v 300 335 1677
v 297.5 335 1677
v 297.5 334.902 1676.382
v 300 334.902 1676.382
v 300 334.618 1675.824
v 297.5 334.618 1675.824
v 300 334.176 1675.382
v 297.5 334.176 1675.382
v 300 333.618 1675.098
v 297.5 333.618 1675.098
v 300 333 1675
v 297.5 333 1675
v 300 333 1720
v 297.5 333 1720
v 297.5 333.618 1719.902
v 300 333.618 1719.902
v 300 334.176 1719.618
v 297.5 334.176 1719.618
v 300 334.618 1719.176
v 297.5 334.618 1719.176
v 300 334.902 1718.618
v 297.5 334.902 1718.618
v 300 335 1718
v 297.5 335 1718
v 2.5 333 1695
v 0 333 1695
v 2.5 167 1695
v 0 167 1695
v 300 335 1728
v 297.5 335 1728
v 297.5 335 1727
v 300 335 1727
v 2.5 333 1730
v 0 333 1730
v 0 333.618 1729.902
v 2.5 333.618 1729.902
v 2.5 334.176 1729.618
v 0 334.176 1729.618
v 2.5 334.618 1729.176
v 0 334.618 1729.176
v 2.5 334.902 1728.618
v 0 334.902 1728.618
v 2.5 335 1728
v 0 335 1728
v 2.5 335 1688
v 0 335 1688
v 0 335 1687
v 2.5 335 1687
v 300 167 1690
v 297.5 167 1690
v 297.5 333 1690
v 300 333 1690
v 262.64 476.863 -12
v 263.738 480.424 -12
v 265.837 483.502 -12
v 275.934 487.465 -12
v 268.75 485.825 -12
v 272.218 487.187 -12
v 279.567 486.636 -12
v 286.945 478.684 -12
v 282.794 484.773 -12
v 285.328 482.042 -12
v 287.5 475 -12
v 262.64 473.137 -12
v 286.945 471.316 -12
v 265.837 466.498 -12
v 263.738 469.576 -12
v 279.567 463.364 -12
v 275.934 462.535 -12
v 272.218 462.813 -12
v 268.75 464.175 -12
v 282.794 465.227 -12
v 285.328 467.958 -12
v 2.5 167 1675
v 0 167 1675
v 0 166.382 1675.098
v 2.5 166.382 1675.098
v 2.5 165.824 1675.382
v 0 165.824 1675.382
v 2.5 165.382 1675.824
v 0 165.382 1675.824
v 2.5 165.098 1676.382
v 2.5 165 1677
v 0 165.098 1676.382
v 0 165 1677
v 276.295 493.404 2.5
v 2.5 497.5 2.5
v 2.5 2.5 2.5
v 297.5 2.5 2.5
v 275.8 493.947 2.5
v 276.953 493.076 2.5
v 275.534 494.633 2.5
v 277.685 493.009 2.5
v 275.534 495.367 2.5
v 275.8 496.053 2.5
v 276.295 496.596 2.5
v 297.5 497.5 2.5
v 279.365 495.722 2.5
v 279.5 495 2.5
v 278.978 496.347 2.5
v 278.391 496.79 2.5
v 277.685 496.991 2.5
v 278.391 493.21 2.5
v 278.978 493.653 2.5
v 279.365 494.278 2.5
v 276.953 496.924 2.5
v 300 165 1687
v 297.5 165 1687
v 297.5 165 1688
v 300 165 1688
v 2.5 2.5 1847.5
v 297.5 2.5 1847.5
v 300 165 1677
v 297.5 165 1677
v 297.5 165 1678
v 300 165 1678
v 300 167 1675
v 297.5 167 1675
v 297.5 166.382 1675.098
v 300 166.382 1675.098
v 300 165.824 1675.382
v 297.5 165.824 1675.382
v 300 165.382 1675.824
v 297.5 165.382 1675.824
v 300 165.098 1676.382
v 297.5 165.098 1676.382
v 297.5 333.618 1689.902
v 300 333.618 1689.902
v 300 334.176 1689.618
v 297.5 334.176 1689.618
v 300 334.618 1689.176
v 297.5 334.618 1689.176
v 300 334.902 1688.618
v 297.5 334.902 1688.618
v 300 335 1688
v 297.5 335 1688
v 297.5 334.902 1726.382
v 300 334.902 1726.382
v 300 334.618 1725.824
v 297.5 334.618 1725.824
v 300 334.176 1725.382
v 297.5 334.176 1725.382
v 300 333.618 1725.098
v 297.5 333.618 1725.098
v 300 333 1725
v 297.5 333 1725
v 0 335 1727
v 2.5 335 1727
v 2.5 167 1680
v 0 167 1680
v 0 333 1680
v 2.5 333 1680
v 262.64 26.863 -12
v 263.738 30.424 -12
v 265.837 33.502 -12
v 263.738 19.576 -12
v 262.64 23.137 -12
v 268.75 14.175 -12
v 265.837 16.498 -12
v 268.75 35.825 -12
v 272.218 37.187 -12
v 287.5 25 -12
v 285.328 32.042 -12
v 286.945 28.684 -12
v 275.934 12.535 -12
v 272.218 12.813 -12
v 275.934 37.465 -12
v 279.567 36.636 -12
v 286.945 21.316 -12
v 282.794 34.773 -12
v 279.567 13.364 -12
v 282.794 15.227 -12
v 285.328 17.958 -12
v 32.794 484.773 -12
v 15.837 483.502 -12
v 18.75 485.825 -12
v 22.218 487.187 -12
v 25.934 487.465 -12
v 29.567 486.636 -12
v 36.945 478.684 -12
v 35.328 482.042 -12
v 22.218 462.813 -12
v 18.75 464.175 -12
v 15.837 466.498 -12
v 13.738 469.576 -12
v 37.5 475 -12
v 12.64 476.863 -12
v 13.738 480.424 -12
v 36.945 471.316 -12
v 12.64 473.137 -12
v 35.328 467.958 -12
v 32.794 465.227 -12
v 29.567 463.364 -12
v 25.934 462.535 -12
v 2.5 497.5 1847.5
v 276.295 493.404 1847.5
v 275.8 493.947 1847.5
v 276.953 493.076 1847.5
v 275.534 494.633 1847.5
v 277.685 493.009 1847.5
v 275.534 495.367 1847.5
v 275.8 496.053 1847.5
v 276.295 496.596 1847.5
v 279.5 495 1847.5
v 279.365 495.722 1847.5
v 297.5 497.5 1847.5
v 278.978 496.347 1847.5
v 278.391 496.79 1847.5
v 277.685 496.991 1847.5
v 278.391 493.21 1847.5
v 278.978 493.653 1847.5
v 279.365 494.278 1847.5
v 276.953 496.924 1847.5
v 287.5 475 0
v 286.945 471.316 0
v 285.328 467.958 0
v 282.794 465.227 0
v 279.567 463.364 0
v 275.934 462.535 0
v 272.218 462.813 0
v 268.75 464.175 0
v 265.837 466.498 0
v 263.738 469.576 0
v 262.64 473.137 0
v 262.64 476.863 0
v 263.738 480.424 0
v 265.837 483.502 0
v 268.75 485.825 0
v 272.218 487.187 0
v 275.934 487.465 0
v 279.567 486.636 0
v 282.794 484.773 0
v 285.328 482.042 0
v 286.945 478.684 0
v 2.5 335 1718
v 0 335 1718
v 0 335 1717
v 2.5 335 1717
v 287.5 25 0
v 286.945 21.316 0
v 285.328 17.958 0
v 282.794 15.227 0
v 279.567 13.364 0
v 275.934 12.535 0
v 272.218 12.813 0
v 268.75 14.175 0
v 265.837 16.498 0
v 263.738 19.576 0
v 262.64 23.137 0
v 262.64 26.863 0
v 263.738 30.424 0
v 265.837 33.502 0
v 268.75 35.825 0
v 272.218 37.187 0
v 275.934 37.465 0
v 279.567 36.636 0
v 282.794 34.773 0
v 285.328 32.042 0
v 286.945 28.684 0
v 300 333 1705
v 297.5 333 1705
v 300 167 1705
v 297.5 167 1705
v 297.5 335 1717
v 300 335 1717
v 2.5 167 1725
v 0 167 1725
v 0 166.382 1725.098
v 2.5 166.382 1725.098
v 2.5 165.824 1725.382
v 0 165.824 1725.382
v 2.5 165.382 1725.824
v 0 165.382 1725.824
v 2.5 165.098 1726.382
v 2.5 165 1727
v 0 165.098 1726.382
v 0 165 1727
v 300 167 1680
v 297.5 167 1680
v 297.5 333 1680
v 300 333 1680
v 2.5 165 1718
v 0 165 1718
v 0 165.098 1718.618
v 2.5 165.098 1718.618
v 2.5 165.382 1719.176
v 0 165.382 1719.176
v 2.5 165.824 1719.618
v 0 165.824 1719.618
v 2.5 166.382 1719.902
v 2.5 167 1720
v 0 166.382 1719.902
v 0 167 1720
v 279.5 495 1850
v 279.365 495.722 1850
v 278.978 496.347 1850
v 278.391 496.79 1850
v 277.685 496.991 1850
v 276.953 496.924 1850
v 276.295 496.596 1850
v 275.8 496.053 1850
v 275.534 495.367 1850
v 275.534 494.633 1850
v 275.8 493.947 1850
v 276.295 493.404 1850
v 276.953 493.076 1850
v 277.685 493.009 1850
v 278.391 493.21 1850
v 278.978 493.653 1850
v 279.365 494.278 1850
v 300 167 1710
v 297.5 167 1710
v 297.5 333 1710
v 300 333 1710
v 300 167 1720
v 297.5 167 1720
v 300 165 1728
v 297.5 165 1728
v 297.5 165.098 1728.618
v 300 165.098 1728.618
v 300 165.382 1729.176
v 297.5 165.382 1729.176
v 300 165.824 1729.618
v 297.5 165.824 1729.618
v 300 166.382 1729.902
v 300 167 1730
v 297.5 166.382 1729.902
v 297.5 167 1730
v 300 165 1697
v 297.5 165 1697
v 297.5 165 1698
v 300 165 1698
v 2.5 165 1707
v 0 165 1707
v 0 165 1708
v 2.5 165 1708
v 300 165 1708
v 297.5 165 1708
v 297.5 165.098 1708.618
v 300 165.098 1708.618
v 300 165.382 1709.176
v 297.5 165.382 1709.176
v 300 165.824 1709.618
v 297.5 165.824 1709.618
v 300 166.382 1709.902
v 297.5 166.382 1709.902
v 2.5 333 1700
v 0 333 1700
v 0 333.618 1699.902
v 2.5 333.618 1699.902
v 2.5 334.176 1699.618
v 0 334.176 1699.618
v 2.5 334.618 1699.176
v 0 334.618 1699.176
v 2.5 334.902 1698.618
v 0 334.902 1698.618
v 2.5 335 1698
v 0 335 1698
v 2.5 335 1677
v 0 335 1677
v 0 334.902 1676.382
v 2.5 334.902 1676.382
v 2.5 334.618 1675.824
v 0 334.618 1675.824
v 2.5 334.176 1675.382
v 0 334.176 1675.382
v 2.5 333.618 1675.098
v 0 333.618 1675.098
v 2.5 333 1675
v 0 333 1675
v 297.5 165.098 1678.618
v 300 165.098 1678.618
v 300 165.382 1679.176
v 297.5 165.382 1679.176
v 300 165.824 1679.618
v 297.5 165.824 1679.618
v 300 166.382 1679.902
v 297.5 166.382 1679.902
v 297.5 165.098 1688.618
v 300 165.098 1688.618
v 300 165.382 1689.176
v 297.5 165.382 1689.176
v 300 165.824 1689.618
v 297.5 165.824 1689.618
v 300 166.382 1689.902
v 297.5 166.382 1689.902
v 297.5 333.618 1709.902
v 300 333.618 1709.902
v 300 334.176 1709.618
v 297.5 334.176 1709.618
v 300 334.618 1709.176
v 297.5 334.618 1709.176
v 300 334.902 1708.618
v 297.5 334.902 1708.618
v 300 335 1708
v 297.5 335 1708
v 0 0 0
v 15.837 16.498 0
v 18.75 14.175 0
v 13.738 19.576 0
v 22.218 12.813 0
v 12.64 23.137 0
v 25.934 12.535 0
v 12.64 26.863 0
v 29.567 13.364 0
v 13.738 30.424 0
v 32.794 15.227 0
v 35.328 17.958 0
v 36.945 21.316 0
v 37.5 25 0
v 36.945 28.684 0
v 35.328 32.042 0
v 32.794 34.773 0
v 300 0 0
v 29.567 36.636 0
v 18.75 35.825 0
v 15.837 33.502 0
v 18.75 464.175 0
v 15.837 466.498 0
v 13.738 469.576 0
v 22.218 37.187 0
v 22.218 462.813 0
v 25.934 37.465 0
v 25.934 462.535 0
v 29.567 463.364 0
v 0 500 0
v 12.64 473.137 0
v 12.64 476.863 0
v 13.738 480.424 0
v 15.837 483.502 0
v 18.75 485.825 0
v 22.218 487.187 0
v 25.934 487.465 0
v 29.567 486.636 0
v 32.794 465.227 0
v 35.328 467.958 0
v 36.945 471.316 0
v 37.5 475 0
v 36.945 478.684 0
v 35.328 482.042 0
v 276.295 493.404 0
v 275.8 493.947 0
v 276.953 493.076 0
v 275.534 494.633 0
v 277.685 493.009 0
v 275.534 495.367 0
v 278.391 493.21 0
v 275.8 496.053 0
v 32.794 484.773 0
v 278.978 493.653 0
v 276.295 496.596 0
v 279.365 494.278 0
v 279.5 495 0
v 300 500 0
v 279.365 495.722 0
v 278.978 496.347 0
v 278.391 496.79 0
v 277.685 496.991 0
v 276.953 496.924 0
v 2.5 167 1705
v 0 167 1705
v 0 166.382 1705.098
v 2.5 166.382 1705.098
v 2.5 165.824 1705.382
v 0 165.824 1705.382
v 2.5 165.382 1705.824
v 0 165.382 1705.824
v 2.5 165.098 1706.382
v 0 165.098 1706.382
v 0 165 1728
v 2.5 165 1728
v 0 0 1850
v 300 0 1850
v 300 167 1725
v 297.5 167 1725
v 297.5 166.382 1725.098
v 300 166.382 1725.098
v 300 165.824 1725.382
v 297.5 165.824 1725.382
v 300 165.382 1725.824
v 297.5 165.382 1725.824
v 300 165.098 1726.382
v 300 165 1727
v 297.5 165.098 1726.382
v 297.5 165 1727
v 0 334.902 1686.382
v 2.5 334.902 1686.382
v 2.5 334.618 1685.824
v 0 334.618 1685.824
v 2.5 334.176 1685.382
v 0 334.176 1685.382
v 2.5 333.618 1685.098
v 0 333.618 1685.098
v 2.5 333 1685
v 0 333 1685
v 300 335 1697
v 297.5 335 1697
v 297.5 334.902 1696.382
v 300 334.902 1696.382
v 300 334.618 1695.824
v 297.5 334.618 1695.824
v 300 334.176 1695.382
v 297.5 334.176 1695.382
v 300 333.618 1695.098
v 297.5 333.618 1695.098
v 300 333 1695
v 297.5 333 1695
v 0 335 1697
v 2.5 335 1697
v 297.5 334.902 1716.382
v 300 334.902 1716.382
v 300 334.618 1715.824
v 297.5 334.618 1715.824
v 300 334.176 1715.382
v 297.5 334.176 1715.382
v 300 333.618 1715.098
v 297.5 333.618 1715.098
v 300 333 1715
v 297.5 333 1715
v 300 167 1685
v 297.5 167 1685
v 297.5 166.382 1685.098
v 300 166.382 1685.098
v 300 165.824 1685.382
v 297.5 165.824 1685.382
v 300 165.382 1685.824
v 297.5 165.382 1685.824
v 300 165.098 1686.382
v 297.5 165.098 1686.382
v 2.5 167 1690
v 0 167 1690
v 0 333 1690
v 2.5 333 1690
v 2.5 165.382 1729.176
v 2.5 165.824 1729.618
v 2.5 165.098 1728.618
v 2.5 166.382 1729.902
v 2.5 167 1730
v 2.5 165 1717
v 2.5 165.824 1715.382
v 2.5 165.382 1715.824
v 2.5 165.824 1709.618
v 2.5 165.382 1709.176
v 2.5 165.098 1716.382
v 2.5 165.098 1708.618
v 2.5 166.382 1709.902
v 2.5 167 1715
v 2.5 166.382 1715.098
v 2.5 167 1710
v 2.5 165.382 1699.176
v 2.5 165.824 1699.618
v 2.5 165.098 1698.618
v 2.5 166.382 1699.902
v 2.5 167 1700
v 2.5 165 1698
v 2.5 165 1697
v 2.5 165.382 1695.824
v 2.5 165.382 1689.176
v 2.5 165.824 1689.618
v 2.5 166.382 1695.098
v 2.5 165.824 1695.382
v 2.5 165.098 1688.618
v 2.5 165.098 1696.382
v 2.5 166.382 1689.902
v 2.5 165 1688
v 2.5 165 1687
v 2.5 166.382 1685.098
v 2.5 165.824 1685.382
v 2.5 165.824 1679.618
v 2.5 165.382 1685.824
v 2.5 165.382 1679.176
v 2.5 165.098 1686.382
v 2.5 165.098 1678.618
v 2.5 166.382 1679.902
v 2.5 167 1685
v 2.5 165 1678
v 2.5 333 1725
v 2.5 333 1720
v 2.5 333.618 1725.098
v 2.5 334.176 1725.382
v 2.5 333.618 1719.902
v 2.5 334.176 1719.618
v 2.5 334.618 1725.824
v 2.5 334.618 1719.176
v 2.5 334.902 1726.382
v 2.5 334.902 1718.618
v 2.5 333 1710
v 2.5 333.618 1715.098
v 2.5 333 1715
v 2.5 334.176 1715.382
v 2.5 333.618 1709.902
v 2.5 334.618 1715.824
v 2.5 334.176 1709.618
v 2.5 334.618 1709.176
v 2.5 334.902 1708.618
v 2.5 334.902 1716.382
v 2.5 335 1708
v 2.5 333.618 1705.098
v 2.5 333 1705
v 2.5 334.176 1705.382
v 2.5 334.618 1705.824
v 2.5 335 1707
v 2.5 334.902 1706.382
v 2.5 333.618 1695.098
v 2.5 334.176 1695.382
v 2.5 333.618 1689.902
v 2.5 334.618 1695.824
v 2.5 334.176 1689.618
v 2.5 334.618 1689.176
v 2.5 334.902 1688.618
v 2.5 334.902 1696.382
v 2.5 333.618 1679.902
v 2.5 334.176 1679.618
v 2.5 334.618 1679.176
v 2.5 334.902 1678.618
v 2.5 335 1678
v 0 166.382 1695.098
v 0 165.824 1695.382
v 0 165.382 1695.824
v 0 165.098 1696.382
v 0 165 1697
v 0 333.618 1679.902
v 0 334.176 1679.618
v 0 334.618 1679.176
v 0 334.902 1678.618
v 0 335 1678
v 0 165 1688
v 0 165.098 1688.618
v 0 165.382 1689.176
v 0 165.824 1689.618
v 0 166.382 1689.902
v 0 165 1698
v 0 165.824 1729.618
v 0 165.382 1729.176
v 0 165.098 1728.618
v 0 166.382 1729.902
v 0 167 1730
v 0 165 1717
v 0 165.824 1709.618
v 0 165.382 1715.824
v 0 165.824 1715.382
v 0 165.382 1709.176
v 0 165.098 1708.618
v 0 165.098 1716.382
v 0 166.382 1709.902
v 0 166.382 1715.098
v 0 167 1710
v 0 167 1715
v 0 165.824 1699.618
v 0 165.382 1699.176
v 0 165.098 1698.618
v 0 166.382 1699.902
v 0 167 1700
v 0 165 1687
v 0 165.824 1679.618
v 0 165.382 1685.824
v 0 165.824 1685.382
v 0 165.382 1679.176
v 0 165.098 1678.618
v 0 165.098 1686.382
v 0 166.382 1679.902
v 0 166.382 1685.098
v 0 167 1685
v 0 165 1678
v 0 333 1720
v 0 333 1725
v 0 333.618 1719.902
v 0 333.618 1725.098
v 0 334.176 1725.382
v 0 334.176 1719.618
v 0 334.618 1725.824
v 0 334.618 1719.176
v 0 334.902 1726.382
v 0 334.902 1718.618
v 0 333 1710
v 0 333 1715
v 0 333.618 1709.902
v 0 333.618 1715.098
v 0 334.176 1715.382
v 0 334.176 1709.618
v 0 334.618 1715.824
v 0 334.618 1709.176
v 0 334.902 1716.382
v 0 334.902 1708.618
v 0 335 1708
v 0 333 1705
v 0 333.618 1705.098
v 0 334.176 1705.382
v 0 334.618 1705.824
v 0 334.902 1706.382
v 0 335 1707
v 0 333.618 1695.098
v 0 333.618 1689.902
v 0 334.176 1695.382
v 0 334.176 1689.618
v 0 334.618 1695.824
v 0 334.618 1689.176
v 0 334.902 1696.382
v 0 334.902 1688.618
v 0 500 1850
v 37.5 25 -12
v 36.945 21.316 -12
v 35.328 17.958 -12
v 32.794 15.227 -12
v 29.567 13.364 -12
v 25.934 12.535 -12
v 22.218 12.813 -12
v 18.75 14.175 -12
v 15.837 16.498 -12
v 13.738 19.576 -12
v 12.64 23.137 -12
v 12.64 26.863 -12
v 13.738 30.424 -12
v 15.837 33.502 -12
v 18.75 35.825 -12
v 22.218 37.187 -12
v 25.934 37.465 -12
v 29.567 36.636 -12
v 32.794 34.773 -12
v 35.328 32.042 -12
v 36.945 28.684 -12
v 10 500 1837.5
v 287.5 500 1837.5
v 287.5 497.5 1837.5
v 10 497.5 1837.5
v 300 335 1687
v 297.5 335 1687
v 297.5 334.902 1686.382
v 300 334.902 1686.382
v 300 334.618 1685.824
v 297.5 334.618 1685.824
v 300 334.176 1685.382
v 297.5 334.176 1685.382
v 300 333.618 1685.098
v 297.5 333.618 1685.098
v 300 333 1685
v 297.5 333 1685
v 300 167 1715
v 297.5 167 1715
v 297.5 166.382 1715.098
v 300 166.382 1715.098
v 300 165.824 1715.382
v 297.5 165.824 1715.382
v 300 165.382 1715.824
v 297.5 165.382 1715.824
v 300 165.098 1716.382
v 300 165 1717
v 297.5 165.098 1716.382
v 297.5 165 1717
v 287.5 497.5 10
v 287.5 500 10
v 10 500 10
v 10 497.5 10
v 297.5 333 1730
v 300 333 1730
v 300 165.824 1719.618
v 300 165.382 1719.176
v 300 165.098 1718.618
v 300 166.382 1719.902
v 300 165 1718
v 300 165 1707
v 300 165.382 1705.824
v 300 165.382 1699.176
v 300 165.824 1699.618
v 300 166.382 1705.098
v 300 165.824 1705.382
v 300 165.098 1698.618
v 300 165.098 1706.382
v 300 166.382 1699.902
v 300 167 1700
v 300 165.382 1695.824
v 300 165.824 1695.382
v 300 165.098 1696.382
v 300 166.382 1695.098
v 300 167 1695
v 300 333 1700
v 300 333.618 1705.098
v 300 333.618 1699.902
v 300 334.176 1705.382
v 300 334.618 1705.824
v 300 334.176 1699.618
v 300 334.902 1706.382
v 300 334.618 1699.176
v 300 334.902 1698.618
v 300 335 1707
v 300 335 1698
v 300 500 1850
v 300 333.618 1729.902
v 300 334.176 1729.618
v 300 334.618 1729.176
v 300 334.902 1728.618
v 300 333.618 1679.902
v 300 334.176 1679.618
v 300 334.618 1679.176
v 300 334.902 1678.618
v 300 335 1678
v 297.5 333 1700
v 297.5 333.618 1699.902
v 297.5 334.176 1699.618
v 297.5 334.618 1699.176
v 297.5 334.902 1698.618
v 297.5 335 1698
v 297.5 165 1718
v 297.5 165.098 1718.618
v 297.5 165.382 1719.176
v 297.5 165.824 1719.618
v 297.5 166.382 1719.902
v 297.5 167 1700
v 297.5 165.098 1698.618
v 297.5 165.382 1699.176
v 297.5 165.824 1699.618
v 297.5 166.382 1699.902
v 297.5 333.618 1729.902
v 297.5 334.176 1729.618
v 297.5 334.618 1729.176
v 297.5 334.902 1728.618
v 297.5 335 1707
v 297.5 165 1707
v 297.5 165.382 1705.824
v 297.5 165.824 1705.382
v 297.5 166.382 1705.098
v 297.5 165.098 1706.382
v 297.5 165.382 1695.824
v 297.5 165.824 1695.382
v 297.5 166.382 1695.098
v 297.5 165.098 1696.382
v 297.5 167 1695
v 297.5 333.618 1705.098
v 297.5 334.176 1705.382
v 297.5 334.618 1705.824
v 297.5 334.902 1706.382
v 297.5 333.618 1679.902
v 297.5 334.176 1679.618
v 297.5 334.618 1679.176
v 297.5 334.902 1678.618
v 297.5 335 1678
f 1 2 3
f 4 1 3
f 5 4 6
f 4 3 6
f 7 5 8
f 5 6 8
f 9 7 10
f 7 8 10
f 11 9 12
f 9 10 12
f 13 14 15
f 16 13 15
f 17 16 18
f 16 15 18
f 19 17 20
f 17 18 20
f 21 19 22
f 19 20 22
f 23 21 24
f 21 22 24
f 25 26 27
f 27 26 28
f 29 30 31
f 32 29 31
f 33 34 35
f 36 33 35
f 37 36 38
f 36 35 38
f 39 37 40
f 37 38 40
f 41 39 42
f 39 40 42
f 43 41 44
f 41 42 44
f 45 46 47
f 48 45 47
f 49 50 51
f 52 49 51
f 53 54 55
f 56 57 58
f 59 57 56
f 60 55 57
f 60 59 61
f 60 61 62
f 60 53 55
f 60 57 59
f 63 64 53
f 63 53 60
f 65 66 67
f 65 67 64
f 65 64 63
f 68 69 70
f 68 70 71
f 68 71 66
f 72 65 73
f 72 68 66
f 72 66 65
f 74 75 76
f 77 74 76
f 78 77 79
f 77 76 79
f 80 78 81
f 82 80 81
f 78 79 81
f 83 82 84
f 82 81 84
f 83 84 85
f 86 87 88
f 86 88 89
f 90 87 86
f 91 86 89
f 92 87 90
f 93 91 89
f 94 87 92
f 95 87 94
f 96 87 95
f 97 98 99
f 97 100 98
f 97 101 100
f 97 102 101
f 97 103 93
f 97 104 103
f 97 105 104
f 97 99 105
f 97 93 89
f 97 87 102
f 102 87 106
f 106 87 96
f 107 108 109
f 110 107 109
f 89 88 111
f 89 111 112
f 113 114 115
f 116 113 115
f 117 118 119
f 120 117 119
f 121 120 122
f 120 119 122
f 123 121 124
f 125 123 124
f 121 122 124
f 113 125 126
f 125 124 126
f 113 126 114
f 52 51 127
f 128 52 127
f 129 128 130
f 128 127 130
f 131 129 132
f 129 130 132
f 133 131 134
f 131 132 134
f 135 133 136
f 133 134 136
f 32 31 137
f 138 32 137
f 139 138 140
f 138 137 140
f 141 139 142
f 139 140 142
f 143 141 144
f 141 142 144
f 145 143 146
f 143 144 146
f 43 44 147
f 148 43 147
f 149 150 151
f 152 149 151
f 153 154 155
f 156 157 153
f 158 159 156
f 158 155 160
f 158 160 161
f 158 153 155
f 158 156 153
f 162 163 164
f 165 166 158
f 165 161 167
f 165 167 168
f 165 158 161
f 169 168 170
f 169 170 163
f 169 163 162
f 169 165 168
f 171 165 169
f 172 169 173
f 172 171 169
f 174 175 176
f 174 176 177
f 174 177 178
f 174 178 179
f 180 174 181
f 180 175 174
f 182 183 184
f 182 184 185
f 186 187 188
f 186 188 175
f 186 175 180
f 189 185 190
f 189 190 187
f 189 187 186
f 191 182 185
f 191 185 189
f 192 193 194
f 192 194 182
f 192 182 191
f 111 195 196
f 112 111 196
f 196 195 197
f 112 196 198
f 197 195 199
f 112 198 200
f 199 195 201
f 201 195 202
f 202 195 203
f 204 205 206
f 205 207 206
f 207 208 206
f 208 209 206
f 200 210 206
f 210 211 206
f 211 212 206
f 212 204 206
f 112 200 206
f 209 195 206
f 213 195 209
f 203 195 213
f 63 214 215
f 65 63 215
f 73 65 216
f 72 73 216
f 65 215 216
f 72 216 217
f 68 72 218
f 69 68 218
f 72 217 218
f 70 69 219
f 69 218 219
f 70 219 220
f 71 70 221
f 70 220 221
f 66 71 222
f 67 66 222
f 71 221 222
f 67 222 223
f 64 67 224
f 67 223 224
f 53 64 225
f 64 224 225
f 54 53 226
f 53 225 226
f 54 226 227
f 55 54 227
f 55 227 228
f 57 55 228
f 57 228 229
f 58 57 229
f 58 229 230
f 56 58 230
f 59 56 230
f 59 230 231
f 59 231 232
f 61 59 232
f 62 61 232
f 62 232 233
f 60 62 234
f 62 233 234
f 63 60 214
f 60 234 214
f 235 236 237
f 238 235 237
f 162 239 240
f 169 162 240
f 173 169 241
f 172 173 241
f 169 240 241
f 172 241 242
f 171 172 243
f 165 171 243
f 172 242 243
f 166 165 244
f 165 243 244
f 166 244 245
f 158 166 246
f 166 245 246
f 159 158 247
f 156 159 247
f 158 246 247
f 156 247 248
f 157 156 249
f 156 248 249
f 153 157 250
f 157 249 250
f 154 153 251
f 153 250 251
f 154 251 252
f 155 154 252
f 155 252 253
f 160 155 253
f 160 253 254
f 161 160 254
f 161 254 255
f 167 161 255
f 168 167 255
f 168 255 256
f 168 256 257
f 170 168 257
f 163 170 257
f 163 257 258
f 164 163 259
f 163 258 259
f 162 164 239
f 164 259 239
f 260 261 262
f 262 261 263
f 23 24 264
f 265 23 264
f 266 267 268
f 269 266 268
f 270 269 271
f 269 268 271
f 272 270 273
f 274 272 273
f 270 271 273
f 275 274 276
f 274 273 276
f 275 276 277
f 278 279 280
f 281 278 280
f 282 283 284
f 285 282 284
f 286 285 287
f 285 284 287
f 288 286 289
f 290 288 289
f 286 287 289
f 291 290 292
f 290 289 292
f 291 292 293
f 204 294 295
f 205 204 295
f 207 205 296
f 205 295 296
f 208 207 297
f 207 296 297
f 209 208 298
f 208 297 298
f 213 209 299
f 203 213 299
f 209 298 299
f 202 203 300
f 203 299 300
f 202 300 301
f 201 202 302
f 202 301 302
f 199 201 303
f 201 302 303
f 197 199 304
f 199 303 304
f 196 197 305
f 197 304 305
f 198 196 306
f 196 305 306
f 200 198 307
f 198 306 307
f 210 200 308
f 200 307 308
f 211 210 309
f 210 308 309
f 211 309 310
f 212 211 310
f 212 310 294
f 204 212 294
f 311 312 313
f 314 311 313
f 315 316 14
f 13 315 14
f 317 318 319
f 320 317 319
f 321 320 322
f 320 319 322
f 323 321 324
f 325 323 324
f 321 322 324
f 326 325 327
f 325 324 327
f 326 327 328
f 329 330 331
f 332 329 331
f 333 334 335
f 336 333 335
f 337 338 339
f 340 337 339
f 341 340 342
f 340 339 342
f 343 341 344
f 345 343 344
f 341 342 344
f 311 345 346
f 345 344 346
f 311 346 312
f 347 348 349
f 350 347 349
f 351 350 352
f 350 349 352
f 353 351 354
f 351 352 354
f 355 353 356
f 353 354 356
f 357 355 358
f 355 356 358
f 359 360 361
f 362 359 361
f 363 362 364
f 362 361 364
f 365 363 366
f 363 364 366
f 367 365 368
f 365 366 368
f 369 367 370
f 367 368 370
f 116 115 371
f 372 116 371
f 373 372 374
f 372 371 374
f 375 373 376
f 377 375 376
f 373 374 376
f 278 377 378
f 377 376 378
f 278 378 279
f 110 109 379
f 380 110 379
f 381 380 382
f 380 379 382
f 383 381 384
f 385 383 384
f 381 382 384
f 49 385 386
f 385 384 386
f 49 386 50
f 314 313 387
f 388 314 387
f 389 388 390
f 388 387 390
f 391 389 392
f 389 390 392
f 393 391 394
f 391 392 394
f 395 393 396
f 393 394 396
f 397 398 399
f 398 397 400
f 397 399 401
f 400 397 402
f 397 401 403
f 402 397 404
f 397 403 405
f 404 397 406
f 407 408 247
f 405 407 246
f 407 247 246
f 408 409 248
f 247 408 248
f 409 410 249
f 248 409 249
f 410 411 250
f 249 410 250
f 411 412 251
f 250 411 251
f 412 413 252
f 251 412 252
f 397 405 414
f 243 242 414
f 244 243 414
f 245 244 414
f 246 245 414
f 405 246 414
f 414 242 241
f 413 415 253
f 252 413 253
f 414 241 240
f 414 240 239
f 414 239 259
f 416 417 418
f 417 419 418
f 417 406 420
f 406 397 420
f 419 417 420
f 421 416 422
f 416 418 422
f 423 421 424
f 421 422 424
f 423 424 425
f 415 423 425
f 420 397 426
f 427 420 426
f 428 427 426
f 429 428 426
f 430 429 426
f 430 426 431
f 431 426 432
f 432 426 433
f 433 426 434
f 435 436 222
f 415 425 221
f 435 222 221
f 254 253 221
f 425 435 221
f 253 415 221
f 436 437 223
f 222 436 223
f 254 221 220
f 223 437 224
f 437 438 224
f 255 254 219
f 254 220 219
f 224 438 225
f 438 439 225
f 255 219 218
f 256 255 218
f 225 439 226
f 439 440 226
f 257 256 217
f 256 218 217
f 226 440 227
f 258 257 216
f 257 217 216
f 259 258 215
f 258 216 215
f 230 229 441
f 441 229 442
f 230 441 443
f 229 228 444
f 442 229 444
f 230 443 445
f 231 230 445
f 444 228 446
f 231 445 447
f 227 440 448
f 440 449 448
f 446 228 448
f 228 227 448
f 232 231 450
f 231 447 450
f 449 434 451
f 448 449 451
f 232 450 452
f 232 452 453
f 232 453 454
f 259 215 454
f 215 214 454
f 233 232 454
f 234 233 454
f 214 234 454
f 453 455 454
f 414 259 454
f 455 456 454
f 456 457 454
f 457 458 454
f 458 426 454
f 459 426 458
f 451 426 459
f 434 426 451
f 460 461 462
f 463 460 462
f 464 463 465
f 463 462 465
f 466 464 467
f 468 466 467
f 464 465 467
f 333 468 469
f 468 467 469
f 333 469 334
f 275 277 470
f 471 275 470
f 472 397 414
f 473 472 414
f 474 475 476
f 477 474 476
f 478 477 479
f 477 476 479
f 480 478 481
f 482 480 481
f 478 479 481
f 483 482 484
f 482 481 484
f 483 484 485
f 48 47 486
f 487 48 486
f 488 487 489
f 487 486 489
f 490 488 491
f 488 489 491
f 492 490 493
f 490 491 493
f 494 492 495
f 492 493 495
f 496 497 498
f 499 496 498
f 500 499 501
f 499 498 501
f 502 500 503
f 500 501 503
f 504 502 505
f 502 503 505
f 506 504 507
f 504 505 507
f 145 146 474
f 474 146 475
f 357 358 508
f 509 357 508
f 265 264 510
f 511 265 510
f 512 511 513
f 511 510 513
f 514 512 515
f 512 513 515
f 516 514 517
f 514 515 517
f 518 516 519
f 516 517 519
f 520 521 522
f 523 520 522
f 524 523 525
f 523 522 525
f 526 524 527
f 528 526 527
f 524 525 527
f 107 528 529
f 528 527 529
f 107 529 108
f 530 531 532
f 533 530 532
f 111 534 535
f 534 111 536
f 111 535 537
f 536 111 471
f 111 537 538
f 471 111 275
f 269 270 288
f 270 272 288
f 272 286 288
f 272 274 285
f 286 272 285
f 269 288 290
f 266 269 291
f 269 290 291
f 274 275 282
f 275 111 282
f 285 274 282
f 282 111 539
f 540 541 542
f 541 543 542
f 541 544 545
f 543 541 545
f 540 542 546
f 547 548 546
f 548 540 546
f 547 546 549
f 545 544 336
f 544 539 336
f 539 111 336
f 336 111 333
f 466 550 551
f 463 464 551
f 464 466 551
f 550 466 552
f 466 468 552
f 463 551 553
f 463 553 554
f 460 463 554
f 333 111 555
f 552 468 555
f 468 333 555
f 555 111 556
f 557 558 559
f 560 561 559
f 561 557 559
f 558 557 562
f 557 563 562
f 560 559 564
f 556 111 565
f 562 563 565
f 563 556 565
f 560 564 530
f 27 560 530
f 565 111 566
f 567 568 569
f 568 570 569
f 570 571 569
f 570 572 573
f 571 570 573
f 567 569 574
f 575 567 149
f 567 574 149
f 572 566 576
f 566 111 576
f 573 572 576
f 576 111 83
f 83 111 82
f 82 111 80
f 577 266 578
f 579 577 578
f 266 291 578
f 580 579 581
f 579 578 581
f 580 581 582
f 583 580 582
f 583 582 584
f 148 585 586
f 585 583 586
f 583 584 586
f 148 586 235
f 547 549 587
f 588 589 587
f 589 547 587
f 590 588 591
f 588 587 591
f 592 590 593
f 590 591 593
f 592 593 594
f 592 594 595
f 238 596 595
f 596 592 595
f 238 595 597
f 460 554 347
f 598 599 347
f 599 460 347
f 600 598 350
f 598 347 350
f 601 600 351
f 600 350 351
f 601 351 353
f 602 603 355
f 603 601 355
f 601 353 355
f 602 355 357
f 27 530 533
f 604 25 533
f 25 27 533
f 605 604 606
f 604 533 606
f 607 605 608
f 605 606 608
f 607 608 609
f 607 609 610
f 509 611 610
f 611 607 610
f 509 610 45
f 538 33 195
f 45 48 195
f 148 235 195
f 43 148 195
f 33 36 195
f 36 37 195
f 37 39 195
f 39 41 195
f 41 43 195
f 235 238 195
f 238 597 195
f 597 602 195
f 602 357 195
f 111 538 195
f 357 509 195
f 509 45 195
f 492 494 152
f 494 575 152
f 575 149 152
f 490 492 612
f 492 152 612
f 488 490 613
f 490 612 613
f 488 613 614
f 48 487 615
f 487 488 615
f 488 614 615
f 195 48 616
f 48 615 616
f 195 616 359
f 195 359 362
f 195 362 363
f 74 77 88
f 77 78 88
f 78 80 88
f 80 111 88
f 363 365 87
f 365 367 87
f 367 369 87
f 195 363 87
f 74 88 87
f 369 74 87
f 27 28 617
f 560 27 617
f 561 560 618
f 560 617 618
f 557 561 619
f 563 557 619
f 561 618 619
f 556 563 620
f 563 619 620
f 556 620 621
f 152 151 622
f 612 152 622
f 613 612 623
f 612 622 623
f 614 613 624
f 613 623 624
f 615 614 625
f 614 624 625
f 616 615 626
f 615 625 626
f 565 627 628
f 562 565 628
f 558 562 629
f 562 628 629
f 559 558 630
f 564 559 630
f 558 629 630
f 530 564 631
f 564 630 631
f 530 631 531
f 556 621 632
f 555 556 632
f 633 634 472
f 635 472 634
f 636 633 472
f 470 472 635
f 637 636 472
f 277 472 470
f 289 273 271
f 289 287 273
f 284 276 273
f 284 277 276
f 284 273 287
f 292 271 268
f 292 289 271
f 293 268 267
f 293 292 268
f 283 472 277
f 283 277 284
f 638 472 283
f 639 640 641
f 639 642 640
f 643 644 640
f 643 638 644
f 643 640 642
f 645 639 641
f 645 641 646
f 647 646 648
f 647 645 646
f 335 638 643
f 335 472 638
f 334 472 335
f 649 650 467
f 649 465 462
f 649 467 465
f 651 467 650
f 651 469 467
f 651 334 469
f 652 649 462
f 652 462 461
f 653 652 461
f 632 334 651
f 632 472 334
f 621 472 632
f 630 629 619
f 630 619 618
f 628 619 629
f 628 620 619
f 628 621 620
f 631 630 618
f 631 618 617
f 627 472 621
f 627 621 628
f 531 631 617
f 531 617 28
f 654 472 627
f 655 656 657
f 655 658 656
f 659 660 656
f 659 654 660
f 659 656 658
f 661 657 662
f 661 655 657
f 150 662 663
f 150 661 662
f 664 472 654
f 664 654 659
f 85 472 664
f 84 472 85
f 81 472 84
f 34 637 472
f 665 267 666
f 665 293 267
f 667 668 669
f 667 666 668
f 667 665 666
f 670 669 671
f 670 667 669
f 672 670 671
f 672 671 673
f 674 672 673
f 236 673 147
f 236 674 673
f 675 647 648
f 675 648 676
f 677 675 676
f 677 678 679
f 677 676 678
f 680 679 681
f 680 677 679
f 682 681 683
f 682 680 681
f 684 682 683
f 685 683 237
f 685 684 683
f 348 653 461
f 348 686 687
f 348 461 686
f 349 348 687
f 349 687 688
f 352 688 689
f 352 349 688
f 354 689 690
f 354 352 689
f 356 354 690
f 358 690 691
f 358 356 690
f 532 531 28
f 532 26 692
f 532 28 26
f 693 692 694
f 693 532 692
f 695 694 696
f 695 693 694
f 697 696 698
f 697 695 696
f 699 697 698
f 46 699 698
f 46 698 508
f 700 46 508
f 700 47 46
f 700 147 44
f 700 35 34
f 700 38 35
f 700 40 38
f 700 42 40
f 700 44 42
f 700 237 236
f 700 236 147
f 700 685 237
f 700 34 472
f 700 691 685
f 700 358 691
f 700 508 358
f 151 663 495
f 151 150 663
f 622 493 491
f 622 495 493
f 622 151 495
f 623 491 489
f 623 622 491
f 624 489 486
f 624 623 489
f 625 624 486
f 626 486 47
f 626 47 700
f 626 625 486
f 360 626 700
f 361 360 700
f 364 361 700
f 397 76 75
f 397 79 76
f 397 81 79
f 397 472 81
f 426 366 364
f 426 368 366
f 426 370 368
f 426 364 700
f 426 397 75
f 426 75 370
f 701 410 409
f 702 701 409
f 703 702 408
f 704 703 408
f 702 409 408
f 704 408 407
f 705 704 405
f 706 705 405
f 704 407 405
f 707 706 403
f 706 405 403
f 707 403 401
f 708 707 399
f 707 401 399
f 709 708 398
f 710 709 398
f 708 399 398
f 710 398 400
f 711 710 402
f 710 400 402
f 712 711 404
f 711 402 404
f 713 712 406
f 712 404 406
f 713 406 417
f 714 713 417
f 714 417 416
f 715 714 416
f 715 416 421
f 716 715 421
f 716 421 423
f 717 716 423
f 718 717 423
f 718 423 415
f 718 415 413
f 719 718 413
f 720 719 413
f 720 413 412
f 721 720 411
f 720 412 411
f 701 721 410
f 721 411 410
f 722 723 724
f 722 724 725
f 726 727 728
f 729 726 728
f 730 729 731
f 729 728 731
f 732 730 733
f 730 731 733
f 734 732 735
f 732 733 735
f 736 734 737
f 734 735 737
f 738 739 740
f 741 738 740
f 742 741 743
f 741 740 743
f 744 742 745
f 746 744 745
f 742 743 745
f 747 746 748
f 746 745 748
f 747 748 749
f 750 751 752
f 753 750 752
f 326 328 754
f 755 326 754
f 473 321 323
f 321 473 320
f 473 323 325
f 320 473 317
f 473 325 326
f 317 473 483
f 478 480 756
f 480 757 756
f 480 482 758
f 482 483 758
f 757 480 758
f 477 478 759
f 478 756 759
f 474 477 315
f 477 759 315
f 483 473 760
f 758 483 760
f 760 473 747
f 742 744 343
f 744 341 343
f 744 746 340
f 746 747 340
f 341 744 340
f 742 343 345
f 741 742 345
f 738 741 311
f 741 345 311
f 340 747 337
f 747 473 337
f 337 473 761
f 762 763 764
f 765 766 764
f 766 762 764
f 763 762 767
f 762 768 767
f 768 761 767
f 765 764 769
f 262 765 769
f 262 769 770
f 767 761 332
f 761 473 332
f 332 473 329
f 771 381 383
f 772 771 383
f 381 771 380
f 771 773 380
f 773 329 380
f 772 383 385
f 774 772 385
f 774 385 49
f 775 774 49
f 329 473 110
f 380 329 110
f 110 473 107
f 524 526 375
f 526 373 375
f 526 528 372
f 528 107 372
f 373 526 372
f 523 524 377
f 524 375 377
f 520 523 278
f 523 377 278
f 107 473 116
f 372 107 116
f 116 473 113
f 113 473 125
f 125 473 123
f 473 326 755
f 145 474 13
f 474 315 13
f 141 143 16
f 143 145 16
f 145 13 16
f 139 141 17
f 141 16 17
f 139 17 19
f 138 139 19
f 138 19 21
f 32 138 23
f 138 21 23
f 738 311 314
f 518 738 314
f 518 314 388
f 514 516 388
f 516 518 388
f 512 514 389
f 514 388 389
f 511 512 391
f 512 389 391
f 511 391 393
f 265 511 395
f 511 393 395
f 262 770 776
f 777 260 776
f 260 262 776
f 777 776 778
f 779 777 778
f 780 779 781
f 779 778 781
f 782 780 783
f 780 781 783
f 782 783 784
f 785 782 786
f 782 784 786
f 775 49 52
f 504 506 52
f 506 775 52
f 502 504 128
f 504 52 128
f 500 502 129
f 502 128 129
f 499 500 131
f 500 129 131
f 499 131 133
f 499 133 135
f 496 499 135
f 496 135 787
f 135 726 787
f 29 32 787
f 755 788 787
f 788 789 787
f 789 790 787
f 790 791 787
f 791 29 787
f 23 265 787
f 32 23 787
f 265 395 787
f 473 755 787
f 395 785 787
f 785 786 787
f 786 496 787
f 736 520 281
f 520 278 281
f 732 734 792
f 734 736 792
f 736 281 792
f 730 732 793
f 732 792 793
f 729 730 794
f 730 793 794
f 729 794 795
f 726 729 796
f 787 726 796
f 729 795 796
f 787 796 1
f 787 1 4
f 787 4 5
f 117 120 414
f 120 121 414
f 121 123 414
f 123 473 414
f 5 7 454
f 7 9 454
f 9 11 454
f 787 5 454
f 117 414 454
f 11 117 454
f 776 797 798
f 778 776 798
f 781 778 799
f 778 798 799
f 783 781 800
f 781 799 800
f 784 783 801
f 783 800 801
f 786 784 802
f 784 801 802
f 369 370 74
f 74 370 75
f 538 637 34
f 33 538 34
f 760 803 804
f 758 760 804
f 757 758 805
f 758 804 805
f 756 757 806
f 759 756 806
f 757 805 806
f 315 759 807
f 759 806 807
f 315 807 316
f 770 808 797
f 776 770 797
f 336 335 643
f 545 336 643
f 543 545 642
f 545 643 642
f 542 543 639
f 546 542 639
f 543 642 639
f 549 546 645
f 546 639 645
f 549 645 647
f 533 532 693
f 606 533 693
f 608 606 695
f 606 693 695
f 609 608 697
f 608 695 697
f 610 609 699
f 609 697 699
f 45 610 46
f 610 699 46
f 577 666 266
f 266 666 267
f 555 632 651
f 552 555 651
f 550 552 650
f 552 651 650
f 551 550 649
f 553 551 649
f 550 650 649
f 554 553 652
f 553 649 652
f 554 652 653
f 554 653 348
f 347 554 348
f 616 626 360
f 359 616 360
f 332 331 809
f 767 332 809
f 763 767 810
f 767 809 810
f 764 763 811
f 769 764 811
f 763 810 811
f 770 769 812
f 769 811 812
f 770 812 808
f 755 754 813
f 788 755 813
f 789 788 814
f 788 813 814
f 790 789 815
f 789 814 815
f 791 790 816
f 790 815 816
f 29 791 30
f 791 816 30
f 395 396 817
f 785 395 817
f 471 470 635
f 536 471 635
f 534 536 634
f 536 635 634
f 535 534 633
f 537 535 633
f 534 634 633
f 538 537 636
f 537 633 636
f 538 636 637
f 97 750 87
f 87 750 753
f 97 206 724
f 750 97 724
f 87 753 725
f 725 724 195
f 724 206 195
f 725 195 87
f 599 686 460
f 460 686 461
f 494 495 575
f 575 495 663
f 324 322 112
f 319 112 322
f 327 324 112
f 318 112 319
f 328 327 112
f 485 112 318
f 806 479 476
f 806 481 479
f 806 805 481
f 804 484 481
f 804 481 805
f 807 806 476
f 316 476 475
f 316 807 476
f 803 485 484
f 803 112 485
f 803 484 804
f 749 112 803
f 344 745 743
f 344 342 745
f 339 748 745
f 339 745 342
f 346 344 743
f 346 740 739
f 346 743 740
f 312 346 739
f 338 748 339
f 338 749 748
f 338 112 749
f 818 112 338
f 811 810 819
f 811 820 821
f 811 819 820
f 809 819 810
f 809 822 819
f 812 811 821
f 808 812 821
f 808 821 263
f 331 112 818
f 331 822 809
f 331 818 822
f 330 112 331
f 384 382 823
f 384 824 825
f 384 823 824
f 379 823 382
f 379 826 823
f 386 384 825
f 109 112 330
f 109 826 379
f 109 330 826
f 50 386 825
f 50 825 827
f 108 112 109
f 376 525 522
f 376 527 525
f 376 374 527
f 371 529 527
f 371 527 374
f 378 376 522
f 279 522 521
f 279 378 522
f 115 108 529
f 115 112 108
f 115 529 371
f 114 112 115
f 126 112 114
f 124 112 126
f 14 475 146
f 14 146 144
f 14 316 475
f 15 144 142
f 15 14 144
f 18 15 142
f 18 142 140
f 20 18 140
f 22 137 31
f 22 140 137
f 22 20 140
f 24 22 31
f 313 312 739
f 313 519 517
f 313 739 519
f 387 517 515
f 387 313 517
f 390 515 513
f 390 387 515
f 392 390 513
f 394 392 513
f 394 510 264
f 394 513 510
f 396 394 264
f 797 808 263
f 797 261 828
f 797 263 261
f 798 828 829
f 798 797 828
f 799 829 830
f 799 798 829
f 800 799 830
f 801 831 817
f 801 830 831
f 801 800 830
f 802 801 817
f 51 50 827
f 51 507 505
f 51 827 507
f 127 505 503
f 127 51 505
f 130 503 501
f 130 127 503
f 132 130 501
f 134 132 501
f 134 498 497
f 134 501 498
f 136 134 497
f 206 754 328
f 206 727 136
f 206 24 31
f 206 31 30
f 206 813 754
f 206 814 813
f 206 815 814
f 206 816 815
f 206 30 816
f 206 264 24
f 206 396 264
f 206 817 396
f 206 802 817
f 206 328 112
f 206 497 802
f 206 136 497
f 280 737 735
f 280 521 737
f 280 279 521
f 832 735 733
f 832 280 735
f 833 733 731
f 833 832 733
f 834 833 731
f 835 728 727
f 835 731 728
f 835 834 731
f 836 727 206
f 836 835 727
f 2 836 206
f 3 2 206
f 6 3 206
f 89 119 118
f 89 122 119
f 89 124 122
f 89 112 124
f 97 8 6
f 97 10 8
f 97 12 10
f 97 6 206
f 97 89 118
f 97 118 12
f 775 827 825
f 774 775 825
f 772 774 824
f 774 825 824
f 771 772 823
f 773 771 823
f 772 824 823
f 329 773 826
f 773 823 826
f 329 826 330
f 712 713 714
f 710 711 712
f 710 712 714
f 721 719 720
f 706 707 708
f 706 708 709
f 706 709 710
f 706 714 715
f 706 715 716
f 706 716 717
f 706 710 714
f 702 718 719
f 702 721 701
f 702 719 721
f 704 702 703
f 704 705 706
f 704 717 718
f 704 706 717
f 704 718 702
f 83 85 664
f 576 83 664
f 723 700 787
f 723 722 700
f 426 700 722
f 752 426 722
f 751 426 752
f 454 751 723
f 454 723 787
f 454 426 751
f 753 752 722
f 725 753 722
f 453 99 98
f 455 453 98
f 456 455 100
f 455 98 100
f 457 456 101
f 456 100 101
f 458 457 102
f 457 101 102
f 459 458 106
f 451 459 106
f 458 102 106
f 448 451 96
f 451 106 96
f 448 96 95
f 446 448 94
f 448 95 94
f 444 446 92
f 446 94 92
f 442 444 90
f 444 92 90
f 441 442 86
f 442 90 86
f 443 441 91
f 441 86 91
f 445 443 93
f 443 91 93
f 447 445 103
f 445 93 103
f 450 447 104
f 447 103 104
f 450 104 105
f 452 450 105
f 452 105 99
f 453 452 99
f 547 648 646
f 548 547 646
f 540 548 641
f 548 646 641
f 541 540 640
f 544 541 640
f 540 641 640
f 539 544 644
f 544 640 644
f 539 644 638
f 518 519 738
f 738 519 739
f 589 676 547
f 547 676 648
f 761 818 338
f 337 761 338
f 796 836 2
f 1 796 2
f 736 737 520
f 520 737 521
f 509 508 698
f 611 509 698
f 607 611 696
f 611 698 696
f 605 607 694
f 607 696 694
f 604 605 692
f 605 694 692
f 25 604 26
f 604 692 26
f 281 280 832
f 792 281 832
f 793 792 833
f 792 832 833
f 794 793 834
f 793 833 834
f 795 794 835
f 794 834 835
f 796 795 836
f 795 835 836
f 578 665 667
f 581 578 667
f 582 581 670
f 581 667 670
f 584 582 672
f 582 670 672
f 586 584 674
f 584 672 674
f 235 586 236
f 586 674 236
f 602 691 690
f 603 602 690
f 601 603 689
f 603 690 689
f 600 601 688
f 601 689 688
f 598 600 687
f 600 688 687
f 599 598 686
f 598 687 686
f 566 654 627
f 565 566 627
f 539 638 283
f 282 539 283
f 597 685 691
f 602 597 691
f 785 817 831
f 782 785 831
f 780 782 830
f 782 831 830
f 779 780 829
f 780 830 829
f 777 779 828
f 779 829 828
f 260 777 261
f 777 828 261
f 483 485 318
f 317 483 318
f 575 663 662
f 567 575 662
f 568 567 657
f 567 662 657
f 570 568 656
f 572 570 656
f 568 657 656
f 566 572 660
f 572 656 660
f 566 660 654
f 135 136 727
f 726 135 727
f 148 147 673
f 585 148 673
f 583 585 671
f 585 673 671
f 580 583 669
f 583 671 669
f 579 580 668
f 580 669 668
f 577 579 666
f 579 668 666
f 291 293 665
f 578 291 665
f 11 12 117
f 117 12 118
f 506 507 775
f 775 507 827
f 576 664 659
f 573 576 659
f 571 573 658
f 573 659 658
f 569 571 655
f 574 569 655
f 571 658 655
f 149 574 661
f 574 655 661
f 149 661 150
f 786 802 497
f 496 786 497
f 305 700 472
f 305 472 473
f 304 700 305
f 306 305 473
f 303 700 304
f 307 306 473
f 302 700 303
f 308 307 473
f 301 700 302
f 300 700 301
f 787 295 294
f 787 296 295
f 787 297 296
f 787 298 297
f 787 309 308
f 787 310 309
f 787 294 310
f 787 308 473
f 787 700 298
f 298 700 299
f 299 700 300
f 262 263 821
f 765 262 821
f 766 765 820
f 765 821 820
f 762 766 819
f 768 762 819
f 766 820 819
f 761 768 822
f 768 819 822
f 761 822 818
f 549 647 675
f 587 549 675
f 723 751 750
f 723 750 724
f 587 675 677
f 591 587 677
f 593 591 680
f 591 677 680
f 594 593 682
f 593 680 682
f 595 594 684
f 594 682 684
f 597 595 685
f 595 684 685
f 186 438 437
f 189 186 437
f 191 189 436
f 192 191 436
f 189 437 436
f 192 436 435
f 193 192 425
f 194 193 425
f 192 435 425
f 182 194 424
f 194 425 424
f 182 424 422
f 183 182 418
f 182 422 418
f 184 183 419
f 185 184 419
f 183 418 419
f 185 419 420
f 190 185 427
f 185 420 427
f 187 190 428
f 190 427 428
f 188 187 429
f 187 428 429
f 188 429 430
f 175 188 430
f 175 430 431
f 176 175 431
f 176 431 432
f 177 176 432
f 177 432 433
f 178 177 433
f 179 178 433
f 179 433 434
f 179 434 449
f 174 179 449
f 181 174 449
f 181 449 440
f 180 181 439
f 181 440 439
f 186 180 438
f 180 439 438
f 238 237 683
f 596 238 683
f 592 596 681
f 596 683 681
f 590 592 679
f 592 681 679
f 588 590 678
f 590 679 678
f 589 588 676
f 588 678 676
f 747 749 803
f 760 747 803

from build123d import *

# Parameters (mm, degrees)
F0_W      = 300
F0_H      = 500
F1_DEPTH  = 1850
F2_T      = -2.5
F3_W      = 297.5
F3_H      = 1847.5
F3_W_2    = 277.5
F3_H_2    = 1827.5
F4_DEPTH  = 2.5
F5_R      = 12.5
F6_DEPTH  = 12
F9_DEPTH  = 300.001
F7_R      = 2
F10_DEPTH = 1862.001


with BuildPart() as f1:
    # F0 (on Top) → F1 (new body)
    with BuildSketch(Plane.XY):
        with Locations((150, 250)):
            Rectangle(F0_W, F0_H)
    extrude(amount=F1_DEPTH)

    # F2
    f2_openings = [f1.faces().sort_by_distance(p)[0] for p in [
        (150, 500, 925),
    ]]
    offset(amount=F2_T, openings=f2_openings)

    # F3 (on face) → F4 (join)
    with BuildSketch(Plane(origin=(0, 500, 0), x_dir=(-1, 0, 0), z_dir=(0, 1, 0))):
        with Locations((-148.75, 923.75)):
            Rectangle(F3_W, F3_H)
        with Locations((-148.75, 923.75)):
            Rectangle(F3_W_2, F3_H_2, mode=Mode.SUBTRACT)
    extrude(amount=-F4_DEPTH)

    # F5 (on face) → F6 (join)
    with BuildSketch(Plane(origin=(0, 0, 0), x_dir=(1, 0, 0), z_dir=(0, 0, -1))):
        with Locations((25, -25)):
            Circle(F5_R)
        with Locations((25, -475)):
            Circle(F5_R)
        with Locations((275, -25)):
            Circle(F5_R)
        with Locations((275, -475)):
            Circle(F5_R)
    extrude(amount=F6_DEPTH)

    # F8 (on face) → F9 (cut, through all)
    with BuildSketch(Plane(origin=(0, 0, 0), x_dir=(0, -1, 0), z_dir=(-1, 0, 0))):
        with BuildLine():
            Line((-167, 1730), (-333, 1730))
            ThreePointArc((-333, 1730), (-334.414214, 1729.414214), (-335, 1728))
            Line((-335, 1728), (-335, 1727))
            ThreePointArc((-335, 1727), (-334.414214, 1725.585786), (-333, 1725))
            Line((-333, 1725), (-167, 1725))
            ThreePointArc((-167, 1725), (-165.585786, 1725.585786), (-165, 1727))
            Line((-165, 1727), (-165, 1728))
            ThreePointArc((-165, 1728), (-165.585786, 1729.414214), (-167, 1730))
        make_face()
        with BuildLine():
            ThreePointArc((-335, 1717), (-334.414214, 1715.585786), (-333, 1715))
            Line((-333, 1715), (-167, 1715))
            ThreePointArc((-167, 1715), (-165.585786, 1715.585786), (-165, 1717))
            Line((-165, 1717), (-165, 1718))
            ThreePointArc((-165, 1718), (-165.585786, 1719.414214), (-167, 1720))
            Line((-167, 1720), (-333, 1720))
            ThreePointArc((-333, 1720), (-334.414214, 1719.414214), (-335, 1718))
            Line((-335, 1718), (-335, 1717))
        make_face()
        with BuildLine():
            ThreePointArc((-335, 1707), (-334.414214, 1705.585786), (-333, 1705))
            Line((-333, 1705), (-167, 1705))
            ThreePointArc((-167, 1705), (-165.585786, 1705.585786), (-165, 1707))
            Line((-165, 1707), (-165, 1708))
            ThreePointArc((-165, 1708), (-165.585786, 1709.414214), (-167, 1710))
            Line((-167, 1710), (-333, 1710))
            ThreePointArc((-333, 1710), (-334.414214, 1709.414214), (-335, 1708))
            Line((-335, 1708), (-335, 1707))
        make_face()
        with BuildLine():
            ThreePointArc((-335, 1697), (-334.414214, 1695.585786), (-333, 1695))
            Line((-333, 1695), (-167, 1695))
            ThreePointArc((-167, 1695), (-165.585786, 1695.585786), (-165, 1697))
            Line((-165, 1697), (-165, 1698))
            ThreePointArc((-165, 1698), (-165.585786, 1699.414214), (-167, 1700))
            Line((-167, 1700), (-333, 1700))
            ThreePointArc((-333, 1700), (-334.414214, 1699.414214), (-335, 1698))
            Line((-335, 1698), (-335, 1697))
        make_face()
        with BuildLine():
            ThreePointArc((-335, 1687), (-334.414214, 1685.585786), (-333, 1685))
            Line((-333, 1685), (-167, 1685))
            ThreePointArc((-167, 1685), (-165.585786, 1685.585786), (-165, 1687))
            Line((-165, 1687), (-165, 1688))
            ThreePointArc((-165, 1688), (-165.585786, 1689.414214), (-167, 1690))
            Line((-167, 1690), (-333, 1690))
            ThreePointArc((-333, 1690), (-334.414214, 1689.414214), (-335, 1688))
            Line((-335, 1688), (-335, 1687))
        make_face()
        with BuildLine():
            ThreePointArc((-335, 1677), (-334.414214, 1675.585786), (-333, 1675))
            Line((-333, 1675), (-167, 1675))
            ThreePointArc((-167, 1675), (-165.585786, 1675.585786), (-165, 1677))
            Line((-165, 1677), (-165, 1678))
            ThreePointArc((-165, 1678), (-165.585786, 1679.414214), (-167, 1680))
            Line((-167, 1680), (-333, 1680))
            ThreePointArc((-333, 1680), (-334.414214, 1679.414214), (-335, 1678))
            Line((-335, 1678), (-335, 1677))
        make_face()
    extrude(amount=-F9_DEPTH, mode=Mode.SUBTRACT)

    # F7 (on face) → F10 (cut, through all)
    with BuildSketch(Plane.XY.offset(1850)):
        with Locations((277.5, 495)):
            Circle(F7_R)
    extrude(amount=-F10_DEPTH, mode=Mode.SUBTRACT)


solid = f1.part
